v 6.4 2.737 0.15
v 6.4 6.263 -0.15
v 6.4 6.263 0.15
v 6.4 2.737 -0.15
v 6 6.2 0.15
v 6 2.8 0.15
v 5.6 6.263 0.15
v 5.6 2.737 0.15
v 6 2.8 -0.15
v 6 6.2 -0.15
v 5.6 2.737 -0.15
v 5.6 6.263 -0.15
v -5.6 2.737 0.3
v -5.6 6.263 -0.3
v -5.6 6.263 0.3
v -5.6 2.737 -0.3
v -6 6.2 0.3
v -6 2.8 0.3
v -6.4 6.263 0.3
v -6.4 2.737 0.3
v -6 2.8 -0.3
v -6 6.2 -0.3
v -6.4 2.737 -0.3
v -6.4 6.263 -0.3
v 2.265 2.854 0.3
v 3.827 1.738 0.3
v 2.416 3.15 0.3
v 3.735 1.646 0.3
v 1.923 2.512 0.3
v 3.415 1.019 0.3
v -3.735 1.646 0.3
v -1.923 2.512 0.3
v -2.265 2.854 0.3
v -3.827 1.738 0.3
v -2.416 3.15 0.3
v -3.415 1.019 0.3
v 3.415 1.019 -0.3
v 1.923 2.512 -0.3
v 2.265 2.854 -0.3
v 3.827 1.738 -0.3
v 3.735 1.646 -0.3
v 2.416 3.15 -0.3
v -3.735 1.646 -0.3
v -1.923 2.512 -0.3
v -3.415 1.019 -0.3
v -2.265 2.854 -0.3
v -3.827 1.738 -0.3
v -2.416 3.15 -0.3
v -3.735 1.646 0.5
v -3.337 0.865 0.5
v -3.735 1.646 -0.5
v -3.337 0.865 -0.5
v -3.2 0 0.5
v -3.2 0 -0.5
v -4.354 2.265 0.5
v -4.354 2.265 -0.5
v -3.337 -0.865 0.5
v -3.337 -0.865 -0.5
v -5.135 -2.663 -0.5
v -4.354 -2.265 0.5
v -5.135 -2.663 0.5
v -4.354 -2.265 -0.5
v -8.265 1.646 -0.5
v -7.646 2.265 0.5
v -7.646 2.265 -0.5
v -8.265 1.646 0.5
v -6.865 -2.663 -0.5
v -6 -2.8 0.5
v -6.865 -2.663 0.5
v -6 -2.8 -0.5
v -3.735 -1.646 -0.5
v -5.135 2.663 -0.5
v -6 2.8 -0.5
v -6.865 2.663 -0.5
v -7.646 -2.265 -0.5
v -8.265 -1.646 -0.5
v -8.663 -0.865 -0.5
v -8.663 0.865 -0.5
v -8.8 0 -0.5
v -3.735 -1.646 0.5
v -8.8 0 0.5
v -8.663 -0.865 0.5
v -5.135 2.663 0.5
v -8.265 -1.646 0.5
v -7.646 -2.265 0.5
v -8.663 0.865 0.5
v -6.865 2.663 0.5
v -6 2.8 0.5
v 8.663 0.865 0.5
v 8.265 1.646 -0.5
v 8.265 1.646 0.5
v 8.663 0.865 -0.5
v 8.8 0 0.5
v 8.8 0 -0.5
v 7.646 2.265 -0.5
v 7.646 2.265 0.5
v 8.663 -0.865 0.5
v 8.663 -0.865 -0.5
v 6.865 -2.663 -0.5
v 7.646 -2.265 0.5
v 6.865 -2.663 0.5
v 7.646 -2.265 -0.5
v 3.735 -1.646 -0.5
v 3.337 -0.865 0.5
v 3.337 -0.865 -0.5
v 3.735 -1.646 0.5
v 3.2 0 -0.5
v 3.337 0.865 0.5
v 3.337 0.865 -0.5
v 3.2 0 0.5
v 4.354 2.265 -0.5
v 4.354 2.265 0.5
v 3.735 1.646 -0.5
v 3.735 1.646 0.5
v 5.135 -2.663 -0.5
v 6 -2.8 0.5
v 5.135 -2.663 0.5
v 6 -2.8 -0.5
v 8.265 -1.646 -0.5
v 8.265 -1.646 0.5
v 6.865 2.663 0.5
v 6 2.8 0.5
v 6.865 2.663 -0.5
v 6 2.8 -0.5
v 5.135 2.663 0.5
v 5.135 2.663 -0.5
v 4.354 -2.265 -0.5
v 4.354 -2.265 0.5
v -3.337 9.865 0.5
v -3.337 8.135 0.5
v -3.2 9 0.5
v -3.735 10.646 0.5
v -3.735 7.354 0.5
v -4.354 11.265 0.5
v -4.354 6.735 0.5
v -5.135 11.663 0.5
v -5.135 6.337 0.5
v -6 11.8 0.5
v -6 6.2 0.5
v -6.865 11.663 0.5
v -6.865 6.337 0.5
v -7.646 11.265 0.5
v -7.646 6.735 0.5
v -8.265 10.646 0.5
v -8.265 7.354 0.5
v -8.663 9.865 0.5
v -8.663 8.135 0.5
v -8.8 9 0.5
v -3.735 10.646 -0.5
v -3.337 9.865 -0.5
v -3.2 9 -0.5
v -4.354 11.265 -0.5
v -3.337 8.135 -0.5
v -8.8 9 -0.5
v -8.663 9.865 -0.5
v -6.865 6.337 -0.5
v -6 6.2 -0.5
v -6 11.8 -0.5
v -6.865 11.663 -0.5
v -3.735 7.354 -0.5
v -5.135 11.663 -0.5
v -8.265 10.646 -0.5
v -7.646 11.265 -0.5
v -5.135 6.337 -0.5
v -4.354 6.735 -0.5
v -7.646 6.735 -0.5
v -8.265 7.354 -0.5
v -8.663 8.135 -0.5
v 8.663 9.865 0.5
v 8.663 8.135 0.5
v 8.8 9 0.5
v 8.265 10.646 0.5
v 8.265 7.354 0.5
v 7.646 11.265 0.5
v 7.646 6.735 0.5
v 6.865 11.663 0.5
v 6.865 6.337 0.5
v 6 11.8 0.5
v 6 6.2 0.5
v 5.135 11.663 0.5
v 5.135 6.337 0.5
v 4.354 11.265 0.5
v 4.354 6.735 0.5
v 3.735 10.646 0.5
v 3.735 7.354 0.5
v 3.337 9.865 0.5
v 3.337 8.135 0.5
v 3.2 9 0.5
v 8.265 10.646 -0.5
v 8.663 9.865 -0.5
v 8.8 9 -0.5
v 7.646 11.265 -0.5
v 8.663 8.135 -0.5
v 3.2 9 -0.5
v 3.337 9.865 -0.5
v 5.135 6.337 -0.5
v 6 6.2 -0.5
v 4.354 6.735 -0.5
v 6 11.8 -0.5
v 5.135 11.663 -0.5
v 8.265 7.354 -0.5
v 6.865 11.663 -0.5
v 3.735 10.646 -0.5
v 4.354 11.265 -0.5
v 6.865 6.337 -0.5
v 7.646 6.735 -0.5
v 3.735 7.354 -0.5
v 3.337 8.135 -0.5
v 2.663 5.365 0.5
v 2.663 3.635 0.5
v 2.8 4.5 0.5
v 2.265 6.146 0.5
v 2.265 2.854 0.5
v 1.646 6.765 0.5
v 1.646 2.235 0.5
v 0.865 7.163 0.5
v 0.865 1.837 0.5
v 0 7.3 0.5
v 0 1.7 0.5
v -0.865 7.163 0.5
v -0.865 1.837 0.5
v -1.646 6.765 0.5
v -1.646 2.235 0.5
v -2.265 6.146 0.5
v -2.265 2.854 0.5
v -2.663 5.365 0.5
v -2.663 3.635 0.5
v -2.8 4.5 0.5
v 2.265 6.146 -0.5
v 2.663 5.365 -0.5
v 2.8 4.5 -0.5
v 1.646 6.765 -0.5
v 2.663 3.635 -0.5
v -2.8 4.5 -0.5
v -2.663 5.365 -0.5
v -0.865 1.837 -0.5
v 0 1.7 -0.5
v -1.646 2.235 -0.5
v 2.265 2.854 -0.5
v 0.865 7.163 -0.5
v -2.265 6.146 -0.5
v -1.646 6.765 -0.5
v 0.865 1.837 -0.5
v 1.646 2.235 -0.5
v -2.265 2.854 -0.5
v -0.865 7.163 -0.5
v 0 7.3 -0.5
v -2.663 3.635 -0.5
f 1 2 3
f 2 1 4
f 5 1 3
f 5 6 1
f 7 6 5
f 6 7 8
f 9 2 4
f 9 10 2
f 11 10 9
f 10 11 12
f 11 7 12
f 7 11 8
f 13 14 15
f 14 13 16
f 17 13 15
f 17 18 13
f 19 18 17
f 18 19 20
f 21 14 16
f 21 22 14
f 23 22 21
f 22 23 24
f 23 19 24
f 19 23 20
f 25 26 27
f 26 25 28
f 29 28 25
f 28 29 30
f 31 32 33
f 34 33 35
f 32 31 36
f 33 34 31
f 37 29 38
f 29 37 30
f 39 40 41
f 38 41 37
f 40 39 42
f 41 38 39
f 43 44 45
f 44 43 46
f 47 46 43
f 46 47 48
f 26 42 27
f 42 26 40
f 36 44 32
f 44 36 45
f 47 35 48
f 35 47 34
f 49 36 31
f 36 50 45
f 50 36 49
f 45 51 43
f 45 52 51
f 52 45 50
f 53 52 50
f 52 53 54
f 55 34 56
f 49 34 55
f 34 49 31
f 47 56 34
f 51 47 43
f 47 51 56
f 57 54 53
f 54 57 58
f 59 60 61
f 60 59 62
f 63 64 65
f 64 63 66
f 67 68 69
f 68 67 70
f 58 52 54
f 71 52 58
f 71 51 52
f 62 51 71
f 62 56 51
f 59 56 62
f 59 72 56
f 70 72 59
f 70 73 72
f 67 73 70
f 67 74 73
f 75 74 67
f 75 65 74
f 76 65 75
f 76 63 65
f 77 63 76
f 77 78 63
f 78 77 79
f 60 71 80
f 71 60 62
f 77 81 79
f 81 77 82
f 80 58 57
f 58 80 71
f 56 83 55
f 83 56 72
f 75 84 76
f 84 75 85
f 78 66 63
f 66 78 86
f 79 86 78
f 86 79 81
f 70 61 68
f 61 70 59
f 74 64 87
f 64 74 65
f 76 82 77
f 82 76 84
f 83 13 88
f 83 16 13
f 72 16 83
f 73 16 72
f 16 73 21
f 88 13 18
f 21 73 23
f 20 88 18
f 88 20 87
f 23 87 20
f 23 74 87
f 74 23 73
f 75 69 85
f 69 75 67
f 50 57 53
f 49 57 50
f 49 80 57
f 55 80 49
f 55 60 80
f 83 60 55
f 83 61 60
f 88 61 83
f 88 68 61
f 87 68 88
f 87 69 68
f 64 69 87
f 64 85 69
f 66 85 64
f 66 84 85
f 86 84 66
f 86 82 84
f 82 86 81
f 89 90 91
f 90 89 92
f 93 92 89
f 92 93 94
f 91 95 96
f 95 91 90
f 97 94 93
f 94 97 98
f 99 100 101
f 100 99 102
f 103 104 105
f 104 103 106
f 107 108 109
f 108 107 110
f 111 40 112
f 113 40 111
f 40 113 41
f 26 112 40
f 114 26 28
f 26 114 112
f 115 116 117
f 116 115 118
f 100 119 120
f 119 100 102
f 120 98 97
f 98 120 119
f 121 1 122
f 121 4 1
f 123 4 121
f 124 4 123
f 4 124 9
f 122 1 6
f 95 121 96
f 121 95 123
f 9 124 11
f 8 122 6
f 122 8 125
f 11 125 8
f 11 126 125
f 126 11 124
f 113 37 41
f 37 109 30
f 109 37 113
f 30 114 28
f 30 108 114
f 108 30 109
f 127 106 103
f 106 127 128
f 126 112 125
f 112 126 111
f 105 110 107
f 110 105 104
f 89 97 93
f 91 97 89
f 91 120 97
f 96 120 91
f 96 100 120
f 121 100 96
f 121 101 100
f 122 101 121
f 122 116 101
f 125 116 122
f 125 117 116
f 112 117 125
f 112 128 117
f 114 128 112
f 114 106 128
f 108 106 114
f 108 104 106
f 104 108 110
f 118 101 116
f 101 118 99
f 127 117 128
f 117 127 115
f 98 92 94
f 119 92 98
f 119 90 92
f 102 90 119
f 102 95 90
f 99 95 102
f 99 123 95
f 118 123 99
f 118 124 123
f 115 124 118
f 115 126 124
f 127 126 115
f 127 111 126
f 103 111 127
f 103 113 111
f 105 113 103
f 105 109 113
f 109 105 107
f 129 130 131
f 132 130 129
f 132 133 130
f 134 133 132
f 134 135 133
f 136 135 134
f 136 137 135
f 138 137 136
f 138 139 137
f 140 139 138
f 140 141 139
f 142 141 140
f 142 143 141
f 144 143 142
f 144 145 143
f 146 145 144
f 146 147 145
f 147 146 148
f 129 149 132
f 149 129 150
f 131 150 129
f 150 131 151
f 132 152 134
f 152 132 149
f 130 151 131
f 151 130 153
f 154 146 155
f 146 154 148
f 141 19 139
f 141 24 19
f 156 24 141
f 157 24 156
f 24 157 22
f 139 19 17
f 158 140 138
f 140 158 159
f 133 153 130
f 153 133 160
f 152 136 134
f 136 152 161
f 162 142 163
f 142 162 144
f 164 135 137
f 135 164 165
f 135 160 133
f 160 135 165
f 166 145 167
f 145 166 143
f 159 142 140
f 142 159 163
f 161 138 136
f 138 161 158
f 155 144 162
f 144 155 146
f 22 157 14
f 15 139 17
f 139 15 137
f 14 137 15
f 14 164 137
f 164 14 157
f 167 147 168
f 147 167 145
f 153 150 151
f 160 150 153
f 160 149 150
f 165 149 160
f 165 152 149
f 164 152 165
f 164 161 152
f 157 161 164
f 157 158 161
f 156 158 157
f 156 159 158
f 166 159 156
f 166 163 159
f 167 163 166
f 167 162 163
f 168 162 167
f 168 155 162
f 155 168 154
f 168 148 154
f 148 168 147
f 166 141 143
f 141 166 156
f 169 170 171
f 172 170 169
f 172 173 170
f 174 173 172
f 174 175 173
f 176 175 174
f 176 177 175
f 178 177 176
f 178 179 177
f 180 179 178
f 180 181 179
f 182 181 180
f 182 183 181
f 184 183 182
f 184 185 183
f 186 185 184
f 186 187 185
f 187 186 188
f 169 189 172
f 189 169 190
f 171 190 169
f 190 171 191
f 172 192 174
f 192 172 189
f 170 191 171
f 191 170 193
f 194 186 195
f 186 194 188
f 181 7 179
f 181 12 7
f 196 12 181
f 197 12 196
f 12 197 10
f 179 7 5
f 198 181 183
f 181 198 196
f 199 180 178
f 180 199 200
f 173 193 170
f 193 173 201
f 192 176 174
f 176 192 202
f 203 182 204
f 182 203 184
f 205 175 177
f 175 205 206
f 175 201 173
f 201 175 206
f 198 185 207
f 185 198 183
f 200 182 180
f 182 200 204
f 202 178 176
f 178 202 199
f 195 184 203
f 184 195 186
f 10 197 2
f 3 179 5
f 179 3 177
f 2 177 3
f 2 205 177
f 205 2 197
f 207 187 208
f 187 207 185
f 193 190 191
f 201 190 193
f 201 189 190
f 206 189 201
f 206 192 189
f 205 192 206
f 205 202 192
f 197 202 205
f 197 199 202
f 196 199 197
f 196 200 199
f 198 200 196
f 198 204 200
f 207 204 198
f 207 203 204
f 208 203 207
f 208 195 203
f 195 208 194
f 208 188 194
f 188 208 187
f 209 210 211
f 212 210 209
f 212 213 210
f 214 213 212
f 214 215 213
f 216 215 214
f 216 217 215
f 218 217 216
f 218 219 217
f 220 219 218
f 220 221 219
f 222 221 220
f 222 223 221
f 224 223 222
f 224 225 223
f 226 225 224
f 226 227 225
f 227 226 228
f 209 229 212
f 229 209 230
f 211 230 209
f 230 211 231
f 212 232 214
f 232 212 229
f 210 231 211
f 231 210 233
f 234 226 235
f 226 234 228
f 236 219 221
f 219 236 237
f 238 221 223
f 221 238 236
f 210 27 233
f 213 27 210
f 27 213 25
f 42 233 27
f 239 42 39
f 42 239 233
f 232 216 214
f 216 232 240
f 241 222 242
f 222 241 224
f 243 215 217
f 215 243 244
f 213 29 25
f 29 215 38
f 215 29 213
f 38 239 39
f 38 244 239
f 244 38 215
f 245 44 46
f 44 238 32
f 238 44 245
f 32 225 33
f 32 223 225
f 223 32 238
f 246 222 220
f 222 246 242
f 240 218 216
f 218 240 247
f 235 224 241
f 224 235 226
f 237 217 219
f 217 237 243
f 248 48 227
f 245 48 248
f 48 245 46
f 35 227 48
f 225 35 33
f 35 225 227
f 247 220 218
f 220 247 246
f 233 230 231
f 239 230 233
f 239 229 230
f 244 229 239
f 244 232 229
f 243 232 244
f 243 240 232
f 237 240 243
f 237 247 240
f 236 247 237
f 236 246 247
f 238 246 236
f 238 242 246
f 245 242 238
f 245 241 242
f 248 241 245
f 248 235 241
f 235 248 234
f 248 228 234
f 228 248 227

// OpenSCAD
circleThickness = 1;
radius = 2.8;

color("DarkGray")
translate([6,7,0])
cube([0.8,9,0.3],center=true);
color("DarkGray")
translate([-6,7,0])
cube([0.8,9,0.6],center=true);

color("DarkGray")
translate([3,2,0])
rotate([0,0,45])
cube([0.8,9,0.6],center=true);

color("DarkGray")
translate([-3,2,0])
rotate([0,0,-45])
cube([0.8,9,0.6],center=true);


translate([-6,0,0])
color("Black")
cylinder(circleThickness, radius, radius, $fn=20,center=true);
translate([6,0,0])
color("Black")
cylinder(circleThickness, radius, radius, $fn=20,center=true);

translate([-6,9,0])
color("Black")
cylinder(circleThickness, radius, radius, $fn=20,center=true);
translate([6,9,0])
color("Black")
cylinder(circleThickness, radius, radius, $fn=20,center=true);
translate([0,4.5,0])
color("Black")
cylinder(circleThickness, radius, radius, $fn=20,center=true);
